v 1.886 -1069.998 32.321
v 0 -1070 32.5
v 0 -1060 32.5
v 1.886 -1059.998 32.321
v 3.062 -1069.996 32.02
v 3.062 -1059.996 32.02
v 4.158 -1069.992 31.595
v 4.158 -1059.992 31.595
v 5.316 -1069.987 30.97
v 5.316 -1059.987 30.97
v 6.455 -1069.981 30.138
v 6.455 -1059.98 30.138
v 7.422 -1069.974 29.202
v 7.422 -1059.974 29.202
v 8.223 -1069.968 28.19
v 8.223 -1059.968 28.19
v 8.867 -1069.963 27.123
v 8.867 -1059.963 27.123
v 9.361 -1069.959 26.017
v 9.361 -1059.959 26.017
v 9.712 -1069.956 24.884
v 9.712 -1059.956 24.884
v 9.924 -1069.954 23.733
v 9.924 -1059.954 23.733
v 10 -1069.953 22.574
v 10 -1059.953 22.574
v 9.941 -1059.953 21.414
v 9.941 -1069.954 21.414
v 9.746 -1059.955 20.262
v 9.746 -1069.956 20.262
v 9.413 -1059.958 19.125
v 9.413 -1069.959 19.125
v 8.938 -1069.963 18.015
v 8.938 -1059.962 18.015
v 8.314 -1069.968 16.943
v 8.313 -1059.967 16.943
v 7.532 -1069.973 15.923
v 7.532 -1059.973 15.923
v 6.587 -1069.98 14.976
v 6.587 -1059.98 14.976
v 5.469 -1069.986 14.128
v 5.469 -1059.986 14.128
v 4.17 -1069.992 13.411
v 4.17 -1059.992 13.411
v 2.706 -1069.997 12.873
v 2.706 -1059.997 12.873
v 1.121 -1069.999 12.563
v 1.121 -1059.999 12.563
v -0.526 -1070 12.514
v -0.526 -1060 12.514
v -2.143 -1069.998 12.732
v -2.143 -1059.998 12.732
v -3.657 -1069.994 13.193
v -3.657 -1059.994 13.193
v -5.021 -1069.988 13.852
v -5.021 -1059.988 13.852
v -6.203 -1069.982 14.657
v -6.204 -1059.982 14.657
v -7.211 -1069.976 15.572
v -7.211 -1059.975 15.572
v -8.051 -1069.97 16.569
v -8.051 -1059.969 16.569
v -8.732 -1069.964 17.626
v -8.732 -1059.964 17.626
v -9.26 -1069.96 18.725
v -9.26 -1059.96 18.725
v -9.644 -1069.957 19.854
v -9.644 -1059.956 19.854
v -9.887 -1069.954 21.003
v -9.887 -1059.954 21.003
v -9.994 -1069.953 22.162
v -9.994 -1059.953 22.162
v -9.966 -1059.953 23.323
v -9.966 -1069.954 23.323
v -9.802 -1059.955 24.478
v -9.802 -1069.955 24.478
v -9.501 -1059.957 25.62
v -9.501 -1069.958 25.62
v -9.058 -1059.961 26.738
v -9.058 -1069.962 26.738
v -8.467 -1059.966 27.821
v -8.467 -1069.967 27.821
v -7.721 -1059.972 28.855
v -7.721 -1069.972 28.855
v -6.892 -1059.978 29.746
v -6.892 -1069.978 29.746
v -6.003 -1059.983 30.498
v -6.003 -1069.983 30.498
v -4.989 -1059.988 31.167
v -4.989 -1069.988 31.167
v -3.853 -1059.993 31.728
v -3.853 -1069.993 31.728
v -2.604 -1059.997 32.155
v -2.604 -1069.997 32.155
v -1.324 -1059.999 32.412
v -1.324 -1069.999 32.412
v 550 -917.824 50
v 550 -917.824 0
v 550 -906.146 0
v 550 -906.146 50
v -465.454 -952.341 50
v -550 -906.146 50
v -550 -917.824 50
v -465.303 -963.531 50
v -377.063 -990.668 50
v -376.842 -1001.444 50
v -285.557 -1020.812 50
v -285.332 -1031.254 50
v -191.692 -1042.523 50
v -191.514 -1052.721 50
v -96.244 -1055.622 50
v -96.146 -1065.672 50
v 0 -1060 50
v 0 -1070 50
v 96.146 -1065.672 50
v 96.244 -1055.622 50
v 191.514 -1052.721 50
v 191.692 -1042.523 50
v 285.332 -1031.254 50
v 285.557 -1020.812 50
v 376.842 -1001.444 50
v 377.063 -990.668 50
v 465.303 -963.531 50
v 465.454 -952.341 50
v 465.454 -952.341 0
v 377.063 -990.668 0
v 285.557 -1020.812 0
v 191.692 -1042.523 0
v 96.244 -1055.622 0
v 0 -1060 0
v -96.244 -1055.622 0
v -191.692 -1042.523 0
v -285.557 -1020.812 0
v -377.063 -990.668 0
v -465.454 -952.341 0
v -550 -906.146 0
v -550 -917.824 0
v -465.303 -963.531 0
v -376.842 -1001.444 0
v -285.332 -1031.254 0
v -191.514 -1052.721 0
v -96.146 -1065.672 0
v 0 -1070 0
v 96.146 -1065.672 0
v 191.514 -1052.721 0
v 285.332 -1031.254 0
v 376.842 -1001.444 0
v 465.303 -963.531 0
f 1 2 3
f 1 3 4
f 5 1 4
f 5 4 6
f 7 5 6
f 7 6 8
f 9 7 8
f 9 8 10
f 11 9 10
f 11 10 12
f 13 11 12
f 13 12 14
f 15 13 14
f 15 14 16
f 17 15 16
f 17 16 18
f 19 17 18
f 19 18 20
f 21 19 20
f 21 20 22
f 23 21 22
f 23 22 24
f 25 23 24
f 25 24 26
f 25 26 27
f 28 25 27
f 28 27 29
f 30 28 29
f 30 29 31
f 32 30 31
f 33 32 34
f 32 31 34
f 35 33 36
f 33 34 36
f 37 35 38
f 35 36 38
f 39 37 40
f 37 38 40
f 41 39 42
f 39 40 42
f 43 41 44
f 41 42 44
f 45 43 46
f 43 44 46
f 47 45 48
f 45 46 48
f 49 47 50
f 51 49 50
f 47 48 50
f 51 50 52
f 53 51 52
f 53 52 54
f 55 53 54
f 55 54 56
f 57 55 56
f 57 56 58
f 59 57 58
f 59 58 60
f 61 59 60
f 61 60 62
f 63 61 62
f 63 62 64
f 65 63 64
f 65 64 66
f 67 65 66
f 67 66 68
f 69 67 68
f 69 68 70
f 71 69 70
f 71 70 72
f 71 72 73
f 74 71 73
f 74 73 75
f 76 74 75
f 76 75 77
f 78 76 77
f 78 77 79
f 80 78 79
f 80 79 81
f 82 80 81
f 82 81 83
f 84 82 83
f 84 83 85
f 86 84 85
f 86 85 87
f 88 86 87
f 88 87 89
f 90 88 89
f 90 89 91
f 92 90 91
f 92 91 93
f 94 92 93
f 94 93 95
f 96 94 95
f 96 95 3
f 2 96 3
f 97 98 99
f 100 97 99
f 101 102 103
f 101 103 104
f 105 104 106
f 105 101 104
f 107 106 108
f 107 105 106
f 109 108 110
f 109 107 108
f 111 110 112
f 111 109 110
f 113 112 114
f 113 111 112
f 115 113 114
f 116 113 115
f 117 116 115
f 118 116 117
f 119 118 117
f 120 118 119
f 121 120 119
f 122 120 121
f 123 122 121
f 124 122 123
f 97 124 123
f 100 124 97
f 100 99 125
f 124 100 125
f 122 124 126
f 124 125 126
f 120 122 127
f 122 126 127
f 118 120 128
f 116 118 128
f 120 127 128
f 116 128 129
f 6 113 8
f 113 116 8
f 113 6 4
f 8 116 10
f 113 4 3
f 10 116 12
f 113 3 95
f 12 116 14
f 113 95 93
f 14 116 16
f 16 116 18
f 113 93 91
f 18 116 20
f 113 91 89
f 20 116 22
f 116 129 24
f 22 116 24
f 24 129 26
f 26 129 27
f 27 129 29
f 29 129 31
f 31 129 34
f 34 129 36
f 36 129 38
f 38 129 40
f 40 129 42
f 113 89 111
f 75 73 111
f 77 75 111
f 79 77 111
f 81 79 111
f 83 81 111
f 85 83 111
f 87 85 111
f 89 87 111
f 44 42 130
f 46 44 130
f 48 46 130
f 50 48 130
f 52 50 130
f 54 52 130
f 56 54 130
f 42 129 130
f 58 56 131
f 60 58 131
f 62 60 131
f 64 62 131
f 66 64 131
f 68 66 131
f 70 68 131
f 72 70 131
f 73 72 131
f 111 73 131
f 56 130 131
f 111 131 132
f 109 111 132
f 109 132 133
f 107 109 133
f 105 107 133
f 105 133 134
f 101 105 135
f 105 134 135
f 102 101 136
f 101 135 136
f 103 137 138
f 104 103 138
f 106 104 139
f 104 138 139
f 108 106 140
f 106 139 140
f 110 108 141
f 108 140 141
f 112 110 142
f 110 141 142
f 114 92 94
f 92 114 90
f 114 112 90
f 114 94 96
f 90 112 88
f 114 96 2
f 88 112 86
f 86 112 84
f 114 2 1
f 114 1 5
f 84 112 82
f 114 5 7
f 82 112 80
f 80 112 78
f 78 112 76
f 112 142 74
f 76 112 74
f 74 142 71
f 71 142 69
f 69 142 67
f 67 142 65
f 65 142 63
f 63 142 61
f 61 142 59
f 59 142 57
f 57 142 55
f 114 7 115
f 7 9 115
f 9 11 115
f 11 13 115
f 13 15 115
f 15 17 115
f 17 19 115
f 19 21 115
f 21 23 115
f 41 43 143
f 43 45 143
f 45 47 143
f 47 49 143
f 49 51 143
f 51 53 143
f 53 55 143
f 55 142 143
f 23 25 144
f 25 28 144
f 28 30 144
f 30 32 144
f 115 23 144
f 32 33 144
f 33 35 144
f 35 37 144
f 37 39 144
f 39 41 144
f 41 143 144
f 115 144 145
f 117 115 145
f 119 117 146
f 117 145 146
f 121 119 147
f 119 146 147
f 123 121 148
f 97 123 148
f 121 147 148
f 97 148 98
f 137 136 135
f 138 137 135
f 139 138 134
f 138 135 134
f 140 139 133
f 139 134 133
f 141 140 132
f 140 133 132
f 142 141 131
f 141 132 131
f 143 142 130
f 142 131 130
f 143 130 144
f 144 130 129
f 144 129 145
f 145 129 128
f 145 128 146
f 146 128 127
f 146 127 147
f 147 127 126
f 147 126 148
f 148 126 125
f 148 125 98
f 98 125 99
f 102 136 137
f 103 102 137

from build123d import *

# Parameters (mm, degrees)
BOSS_EXTRUDE1_DEPTH = 50
SKETCH3_R           = 10
CUT_EXTRUDE1_DEPTH  = 1205.117934423


with BuildPart() as part:
    # Sketch1 → Boss-Extrude1 (new body)
    with BuildSketch(Plane.XY):
        with BuildLine():
            Line((-550, -906.145683651), (-550, -917.823512447))
            ThreePointArc((-550, -917.823512447), (0, -1070), (550, -917.823512447))
            Line((550, -917.823512447), (550, -906.145683651))
            ThreePointArc((550, -906.145683651), (0, -1060), (-550, -906.145683651))
        make_face()
    extrude(amount=BOSS_EXTRUDE1_DEPTH)

    # Sketch3 → Cut-Extrude1 (cut, through all)
    with BuildSketch(Plane(origin=(0, 0, 0), x_dir=(1, 0, 0), z_dir=(0, 1, 0))):
        with Locations(Location((0, -22.5, 0), (0, 0, 270))):
            Circle(SKETCH3_R)
    extrude(amount=-CUT_EXTRUDE1_DEPTH, mode=Mode.SUBTRACT)


solid = part.part
